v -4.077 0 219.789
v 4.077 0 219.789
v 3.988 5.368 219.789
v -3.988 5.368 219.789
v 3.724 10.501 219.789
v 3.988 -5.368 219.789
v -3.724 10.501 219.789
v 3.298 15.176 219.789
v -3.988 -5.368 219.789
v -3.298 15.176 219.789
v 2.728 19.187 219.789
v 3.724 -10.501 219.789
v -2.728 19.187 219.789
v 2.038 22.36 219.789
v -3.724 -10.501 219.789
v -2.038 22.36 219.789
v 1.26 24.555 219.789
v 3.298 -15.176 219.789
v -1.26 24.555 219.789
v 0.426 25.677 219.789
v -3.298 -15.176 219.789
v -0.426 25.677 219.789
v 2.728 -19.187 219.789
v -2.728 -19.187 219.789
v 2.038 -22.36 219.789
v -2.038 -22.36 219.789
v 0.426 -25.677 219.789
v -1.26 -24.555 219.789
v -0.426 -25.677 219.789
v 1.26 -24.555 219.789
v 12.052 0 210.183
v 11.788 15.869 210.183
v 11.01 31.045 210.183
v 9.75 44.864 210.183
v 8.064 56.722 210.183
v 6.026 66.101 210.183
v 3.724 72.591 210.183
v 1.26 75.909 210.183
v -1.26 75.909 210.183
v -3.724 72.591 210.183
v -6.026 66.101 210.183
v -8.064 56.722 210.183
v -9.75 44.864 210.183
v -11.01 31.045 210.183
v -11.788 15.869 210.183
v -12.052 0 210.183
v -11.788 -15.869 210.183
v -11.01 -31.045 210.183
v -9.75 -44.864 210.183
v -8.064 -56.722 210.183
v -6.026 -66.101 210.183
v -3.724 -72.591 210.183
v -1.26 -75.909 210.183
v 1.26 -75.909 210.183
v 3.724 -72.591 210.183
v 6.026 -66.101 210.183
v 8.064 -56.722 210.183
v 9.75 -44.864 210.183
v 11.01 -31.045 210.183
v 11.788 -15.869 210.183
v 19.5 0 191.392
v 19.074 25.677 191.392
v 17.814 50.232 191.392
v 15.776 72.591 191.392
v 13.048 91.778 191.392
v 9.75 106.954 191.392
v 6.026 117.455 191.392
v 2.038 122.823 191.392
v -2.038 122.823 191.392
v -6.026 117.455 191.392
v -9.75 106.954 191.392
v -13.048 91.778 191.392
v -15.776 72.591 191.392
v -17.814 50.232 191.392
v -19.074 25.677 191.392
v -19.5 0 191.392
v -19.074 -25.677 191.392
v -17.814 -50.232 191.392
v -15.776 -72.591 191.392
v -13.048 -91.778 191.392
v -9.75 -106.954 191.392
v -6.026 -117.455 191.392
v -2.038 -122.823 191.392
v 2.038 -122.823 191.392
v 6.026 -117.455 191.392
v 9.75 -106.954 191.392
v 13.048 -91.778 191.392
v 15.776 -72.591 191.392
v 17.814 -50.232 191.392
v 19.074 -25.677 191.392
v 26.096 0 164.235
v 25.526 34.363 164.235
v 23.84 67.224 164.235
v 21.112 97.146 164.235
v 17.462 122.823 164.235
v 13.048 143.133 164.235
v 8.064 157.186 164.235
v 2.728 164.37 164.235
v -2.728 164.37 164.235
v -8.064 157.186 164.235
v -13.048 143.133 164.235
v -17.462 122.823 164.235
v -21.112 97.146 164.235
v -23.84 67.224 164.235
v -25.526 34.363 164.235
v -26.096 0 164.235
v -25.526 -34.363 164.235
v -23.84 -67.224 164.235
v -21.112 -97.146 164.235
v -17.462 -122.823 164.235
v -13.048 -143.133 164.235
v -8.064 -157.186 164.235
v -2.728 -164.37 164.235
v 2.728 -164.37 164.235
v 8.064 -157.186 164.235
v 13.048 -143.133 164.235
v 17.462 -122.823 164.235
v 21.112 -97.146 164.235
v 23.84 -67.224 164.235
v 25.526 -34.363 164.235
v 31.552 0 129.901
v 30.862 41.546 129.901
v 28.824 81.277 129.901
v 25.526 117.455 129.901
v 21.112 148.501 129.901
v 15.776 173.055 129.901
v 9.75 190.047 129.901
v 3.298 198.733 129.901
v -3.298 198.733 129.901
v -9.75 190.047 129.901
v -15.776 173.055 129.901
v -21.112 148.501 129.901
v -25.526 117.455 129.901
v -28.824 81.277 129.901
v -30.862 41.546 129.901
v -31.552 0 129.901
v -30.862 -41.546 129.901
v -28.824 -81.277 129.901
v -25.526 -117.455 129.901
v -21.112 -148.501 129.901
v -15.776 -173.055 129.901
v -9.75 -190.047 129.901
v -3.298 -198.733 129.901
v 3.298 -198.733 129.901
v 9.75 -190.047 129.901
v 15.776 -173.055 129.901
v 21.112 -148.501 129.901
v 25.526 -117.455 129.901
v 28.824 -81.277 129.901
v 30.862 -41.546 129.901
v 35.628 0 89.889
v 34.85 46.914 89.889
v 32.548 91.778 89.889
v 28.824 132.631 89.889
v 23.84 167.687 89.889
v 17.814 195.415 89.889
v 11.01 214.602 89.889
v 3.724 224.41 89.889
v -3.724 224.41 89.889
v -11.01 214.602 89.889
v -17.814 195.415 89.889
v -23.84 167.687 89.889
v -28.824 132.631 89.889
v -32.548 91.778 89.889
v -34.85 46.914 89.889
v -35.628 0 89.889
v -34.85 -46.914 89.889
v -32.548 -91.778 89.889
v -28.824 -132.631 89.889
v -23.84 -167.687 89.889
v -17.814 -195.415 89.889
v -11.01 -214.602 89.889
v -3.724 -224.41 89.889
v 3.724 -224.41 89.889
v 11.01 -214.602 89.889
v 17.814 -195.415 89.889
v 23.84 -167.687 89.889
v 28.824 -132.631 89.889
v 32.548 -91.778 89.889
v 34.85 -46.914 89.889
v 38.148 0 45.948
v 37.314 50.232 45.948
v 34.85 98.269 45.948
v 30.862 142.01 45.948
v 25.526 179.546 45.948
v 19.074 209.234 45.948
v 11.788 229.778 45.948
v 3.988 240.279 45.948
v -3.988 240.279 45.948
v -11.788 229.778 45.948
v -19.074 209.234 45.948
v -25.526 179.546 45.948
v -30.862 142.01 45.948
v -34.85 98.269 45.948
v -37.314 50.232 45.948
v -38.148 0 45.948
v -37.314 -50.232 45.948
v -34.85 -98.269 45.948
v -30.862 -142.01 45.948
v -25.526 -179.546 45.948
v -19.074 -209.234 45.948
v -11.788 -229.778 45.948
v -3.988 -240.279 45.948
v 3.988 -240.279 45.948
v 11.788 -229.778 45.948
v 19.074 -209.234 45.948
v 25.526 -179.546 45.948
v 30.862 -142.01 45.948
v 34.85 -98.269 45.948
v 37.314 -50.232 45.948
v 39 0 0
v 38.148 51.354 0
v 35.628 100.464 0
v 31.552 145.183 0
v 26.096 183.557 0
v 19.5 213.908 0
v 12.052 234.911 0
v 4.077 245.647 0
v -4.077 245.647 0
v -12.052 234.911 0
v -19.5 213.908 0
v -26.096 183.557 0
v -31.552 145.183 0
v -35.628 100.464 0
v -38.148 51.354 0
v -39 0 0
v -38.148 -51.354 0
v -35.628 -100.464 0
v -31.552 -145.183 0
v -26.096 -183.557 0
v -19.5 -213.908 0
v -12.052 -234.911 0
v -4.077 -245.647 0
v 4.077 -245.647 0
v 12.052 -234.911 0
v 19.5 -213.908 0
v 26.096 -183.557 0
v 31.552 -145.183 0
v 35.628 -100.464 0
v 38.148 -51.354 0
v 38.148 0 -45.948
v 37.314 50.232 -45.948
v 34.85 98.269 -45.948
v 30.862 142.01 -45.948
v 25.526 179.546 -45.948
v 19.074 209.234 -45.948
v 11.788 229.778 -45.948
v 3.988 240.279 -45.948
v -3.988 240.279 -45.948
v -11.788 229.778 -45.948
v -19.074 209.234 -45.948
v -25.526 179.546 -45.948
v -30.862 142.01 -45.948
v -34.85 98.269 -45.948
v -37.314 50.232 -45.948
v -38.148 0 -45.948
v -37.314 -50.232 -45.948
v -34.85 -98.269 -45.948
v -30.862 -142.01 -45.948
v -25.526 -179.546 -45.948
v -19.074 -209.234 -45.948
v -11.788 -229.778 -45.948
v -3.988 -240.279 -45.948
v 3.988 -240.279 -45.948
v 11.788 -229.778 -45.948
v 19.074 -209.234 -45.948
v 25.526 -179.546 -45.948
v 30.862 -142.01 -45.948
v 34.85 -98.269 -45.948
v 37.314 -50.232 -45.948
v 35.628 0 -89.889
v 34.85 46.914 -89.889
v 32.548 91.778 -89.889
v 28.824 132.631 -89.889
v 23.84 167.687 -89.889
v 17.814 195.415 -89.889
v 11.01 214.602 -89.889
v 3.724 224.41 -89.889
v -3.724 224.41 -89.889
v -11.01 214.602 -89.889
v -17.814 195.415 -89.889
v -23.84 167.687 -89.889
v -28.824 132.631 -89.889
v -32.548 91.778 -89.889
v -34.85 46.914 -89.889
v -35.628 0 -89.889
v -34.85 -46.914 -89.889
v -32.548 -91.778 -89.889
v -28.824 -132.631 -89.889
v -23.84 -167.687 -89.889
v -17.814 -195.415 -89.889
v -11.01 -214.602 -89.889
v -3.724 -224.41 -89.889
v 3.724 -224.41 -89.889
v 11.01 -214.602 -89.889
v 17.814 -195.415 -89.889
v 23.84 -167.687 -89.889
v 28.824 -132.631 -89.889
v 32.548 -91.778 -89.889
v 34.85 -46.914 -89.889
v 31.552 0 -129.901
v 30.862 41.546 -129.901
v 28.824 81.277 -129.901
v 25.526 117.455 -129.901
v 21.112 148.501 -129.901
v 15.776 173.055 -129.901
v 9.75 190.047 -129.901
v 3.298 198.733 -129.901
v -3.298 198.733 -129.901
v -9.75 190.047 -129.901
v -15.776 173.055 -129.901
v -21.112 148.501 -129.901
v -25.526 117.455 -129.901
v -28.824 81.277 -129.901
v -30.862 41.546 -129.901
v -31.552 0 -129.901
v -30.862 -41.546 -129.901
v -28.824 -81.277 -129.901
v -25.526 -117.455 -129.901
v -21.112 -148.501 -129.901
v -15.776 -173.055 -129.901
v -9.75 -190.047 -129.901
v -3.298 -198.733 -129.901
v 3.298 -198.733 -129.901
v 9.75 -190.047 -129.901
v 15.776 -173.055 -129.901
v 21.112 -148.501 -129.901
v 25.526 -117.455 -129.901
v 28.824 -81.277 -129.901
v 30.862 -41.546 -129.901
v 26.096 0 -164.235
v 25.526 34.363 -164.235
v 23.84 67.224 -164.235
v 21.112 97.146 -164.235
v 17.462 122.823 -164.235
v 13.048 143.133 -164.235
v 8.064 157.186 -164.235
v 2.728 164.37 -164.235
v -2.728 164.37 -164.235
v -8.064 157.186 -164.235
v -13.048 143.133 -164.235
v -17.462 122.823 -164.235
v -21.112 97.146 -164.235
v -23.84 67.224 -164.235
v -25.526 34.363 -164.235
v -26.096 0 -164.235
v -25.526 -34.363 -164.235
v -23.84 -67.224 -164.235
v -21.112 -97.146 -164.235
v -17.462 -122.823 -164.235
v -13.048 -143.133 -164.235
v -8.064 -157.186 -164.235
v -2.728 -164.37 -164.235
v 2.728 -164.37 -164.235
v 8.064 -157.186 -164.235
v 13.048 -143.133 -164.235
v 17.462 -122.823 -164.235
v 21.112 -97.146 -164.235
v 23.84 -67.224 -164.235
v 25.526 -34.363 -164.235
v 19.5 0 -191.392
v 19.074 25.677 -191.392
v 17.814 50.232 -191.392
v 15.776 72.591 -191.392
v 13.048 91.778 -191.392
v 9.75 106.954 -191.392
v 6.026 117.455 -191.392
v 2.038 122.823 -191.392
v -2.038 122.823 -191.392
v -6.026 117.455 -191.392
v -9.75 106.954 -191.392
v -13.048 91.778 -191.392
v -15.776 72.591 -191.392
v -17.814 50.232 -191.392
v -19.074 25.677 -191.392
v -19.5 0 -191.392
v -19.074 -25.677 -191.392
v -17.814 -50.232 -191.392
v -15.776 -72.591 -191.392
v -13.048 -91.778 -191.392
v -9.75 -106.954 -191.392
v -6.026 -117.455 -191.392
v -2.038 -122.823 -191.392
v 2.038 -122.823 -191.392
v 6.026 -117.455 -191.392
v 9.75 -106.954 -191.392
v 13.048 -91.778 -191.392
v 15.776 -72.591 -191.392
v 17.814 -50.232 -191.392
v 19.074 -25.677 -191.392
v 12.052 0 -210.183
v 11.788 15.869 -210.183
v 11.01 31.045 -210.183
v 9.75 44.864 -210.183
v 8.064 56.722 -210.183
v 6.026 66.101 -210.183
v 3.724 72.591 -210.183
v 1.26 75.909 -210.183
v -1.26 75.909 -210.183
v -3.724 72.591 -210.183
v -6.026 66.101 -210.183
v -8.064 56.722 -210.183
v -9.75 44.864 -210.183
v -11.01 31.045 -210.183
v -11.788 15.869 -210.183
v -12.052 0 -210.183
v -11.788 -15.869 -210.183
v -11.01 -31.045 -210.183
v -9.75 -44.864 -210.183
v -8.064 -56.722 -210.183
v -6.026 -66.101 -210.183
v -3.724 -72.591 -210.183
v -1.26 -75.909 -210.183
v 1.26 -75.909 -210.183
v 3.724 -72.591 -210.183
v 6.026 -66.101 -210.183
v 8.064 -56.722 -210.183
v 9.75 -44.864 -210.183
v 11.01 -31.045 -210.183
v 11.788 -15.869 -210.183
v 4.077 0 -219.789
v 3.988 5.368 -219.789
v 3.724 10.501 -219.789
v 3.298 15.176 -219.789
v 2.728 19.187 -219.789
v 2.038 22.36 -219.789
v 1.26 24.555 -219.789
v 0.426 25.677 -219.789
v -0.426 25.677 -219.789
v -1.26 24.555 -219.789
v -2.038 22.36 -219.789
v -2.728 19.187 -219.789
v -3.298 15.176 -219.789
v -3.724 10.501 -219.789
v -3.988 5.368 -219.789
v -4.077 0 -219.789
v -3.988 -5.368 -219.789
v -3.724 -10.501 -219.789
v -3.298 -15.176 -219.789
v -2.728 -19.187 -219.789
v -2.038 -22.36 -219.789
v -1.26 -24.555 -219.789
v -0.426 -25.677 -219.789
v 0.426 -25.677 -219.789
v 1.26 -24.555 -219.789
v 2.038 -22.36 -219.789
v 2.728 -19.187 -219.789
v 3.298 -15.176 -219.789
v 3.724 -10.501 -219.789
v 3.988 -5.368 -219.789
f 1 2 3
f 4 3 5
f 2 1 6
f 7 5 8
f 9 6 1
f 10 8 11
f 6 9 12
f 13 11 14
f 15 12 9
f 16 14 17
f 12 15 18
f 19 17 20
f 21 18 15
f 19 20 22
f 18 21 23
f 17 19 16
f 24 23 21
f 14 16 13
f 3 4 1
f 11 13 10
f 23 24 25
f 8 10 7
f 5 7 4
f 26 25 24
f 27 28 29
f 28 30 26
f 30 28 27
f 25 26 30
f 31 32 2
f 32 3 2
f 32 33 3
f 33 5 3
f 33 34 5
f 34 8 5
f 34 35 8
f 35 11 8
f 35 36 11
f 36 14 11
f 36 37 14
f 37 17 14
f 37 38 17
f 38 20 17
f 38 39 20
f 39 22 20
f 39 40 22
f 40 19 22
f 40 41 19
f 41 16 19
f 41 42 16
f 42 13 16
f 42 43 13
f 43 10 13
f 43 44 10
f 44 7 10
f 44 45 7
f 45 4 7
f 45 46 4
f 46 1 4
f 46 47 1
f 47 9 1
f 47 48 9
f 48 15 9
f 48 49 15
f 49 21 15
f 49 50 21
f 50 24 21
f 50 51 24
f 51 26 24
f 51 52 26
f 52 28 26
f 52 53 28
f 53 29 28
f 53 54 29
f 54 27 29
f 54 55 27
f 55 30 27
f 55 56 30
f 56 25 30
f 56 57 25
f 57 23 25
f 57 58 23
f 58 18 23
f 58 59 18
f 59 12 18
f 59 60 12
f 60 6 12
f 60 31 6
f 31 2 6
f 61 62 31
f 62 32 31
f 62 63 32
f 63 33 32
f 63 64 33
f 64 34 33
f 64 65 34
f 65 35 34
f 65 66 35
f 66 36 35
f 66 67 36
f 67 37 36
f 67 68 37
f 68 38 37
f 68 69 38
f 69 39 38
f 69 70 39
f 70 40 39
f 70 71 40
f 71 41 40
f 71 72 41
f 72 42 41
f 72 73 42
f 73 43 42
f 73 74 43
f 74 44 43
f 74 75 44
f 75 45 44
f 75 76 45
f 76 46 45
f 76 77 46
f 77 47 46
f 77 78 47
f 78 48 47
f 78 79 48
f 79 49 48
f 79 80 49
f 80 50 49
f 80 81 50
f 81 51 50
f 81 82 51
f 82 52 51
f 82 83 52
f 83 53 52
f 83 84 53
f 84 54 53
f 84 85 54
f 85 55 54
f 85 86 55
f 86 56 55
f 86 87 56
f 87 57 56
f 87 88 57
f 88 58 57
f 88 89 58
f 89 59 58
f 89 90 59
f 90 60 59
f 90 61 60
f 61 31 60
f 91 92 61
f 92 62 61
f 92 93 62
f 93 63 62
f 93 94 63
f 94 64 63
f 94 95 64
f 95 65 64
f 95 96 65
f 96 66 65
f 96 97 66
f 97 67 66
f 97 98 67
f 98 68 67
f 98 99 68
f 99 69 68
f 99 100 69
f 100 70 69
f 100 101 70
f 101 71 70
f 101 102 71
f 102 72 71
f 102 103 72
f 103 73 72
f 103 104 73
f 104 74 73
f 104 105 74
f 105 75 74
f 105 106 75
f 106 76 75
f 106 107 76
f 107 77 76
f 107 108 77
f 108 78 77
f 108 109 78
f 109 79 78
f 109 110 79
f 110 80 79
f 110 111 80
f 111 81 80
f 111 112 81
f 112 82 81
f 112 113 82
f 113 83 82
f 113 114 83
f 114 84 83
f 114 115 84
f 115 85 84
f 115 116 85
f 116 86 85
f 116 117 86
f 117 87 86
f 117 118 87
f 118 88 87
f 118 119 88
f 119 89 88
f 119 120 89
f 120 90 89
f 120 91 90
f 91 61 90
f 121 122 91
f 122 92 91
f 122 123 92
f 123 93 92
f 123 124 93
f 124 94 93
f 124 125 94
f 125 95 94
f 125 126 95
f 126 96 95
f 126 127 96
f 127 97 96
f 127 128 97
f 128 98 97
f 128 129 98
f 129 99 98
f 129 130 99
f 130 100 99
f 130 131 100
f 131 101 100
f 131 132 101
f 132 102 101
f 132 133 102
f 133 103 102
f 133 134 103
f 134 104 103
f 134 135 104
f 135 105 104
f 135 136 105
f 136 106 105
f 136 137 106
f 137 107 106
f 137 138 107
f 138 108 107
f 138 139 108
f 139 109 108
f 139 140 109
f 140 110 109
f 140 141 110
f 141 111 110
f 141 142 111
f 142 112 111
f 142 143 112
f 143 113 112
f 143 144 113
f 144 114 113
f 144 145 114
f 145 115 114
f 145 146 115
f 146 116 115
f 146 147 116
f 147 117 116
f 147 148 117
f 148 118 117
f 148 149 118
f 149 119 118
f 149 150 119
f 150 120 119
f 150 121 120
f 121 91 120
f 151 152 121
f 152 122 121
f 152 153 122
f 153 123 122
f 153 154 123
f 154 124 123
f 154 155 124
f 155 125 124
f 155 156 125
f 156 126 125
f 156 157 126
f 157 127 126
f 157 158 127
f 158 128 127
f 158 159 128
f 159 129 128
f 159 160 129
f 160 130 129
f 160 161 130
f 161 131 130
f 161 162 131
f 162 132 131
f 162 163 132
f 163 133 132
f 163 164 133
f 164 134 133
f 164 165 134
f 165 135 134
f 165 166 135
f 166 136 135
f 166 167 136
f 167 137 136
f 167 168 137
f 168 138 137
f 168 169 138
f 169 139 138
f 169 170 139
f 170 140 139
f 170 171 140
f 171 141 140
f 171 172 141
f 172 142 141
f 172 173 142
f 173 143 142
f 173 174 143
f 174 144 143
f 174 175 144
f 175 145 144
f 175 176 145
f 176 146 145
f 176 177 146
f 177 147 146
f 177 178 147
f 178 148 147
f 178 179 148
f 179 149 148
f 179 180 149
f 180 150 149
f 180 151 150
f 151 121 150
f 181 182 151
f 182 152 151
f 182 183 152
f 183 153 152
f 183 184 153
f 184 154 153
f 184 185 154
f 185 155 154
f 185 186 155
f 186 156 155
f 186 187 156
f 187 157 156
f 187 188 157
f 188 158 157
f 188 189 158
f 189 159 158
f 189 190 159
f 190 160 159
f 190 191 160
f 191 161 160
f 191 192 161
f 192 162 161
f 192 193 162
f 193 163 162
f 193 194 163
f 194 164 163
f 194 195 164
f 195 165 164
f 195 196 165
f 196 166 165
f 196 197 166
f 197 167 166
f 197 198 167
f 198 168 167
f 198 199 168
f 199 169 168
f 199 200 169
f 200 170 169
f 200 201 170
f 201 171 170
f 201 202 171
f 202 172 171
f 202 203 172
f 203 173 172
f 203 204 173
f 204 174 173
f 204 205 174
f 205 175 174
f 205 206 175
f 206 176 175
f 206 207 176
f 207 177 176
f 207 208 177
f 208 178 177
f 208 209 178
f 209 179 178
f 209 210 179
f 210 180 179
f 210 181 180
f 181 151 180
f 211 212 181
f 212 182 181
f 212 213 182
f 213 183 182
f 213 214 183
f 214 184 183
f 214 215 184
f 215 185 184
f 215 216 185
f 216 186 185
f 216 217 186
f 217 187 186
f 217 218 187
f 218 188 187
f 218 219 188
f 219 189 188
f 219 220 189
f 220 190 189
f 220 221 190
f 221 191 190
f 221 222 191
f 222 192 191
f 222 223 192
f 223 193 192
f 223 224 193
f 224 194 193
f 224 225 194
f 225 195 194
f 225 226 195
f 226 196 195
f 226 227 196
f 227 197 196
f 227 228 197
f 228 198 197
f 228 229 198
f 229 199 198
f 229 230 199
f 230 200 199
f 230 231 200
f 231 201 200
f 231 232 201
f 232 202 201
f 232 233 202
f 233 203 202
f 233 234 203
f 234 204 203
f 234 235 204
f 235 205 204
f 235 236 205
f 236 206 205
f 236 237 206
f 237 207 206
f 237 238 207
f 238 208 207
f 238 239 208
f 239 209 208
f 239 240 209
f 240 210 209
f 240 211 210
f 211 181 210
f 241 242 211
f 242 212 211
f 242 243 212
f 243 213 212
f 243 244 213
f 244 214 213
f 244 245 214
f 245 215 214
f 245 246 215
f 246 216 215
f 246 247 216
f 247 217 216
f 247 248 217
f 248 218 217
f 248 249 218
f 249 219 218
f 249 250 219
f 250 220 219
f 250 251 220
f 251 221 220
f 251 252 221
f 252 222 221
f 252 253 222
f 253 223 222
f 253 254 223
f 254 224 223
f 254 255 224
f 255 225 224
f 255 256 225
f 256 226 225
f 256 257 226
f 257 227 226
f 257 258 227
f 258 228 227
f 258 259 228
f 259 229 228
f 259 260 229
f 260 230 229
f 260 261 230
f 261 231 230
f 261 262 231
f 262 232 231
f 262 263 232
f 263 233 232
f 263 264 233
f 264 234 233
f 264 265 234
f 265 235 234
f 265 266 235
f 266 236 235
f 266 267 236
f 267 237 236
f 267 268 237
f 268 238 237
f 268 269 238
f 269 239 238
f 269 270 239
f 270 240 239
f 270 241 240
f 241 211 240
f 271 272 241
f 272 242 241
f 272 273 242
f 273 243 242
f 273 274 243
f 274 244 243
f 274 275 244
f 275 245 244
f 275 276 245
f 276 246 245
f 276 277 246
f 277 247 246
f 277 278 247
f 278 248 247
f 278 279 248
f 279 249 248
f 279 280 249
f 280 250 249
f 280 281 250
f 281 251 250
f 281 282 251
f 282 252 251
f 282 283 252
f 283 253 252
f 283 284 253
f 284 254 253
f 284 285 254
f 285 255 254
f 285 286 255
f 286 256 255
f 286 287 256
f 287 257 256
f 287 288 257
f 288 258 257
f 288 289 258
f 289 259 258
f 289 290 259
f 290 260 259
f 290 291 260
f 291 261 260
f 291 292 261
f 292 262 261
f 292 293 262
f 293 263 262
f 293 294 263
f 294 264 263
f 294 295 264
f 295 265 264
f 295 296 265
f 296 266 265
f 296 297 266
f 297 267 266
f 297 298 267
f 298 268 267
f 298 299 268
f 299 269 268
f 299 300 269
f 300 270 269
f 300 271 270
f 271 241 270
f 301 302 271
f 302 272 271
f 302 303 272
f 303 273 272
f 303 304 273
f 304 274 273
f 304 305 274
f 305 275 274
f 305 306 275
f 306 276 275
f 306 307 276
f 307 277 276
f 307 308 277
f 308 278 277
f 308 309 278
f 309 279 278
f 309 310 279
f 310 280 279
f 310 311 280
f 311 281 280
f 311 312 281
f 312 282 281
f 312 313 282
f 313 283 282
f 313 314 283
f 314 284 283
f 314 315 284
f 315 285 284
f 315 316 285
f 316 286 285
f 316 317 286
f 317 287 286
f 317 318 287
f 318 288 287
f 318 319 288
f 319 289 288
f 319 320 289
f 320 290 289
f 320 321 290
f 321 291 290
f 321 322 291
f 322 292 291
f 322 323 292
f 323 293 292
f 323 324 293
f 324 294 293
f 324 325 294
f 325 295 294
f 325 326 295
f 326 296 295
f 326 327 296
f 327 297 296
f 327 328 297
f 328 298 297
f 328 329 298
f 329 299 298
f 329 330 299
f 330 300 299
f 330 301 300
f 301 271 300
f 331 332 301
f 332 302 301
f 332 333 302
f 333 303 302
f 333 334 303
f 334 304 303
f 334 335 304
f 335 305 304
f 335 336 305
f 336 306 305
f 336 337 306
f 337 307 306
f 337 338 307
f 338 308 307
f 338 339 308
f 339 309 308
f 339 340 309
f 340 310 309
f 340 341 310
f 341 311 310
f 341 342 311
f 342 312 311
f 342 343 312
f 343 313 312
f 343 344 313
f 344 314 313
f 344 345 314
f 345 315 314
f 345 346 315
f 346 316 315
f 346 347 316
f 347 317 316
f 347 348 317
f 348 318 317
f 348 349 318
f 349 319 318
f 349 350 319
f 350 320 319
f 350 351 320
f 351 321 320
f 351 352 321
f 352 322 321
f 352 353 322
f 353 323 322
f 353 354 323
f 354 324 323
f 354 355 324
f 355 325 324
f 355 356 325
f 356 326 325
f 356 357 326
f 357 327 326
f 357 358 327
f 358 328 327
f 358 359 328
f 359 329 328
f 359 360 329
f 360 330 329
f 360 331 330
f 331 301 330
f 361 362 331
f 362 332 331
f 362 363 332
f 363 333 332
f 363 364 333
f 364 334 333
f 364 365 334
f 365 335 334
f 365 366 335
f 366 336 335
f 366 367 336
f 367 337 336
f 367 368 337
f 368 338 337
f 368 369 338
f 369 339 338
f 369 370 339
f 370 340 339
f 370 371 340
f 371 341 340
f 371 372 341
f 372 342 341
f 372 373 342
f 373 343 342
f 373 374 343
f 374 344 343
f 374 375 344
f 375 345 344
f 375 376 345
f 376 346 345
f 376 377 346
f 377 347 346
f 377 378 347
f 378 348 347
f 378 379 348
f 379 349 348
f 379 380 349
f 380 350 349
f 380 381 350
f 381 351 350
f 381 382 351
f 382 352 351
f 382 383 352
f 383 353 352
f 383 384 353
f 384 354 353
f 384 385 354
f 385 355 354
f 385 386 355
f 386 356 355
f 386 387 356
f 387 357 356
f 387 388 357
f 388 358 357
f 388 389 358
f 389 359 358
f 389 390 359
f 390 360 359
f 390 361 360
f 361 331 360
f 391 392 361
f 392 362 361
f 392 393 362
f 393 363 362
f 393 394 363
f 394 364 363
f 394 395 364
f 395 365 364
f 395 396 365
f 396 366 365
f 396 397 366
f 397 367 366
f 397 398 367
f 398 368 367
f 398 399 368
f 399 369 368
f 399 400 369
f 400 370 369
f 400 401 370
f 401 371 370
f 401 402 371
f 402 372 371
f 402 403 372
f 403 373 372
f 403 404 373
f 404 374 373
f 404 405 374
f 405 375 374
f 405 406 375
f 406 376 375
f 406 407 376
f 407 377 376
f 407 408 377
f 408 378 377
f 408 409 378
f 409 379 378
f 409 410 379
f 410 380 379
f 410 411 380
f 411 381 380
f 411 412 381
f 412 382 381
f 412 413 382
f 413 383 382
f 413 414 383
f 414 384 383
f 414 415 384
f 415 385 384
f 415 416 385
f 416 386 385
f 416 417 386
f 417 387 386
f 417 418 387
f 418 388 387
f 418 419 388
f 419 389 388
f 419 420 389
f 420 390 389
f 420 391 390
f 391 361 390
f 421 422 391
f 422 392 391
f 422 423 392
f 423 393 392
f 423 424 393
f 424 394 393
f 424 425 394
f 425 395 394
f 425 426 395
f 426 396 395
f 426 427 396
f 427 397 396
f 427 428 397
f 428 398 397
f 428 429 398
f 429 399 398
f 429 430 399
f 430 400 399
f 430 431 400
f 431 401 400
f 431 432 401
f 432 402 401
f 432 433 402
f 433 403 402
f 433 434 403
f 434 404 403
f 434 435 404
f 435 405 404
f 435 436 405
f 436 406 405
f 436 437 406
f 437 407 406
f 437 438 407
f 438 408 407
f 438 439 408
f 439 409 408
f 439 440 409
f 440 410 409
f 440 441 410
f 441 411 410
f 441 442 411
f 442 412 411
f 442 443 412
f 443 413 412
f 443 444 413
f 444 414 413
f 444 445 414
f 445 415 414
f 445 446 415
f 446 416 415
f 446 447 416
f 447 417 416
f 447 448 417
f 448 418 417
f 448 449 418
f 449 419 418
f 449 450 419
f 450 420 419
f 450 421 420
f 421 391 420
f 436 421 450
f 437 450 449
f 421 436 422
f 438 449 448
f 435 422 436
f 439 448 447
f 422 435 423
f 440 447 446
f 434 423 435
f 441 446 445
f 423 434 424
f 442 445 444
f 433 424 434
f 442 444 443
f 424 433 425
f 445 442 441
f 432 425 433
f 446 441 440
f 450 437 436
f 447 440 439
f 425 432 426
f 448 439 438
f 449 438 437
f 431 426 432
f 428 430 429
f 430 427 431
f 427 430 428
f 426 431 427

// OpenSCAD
// Generated by SolidPython 1.0.1 on 2020-07-29 00:46:46


scale(v = [3, 19, 17]) {
	sphere(r = 13);
}
/***********************************************
*********      SolidPython code:      **********
************************************************
 
# import packages: SolidPython
from solid import *
from solid.utils import *
from itertools import chain, combinations, permutations


class Resize:

    def __init__(self, scad_file):
        self.scad_file = scad_file
        #self.scad_file = import_scad(scad_file)
        # cone/cylinder param:
        self.r1 = 0
        self.r2 = 0
        self.h = 0
        # rectangular prism param:
        self.w = 0
        self.l = 0
        # ellipse param:
        self.r = 0

    # import OpenScad code (file name corresponds to shape)


    # classify shape + parameters
    def assign(self, param1, param2, param3):
        if self.scad_file == 'cone.scad':
            self.r1 = param1
            self.r2 = param2
            self.h = param3
        elif self.scad_file == 'cylinder.scad':
            self.r1 = param1
            self.r2 = param2
            self.h = param3
        elif self.scad_file == 'rectangularPrism.scad':
            self.h = param1
            self.l = param2
            self.w = param3
        else:
            self.r = param1
            self.h = param2

    # resize parameters
    def iterate(self):
        x = range(3, 20, 2)
        i = 1
        if self.scad_file == 'cone.scad':
            tempList = list(permutations(x, 2))
            for temp in tempList:
                param1 = temp[0]
                param2 = temp[1]
                filepath = 'produced_scad_files/' + 'cone' + str(param1) + '_' + str(param2) + '_' + '.scad'
                scad_render_to_file(cylinder(h=param1, r1=param2, r2=0), filepath)

        elif self.scad_file == 'cylinder.scad':
            tempList = list(permutations(x, 3))
            for temp in tempList:
                param1 = temp[0]
                param2 = temp[1]
                filepath = 'produced_scad_files/' + 'cylinder' + str(param1) + '_' + str(param2) + '_' + '.scad'
                scad_render_to_file(cylinder(h=param1, r1=param2, r2=param2), filepath)

        elif self.scad_file == 'rectangularPrism.scad':
            tempList = list(permutations(x, 3))
            for temp in tempList:
                param1 = temp[0]
                param2 = temp[1]
                param3 = temp[2]
                filepath = 'produced_scad_files/' + 'rectangularPrism' + str(param1) + '_' + str(param2) + '_' + str(
                    param3) + '.scad'
                scad_render_to_file(cube(size=(param1, param2, param3)), filepath)

        elif self.scad_file == 'ellipse.scad':
            tempList = list(permutations(x, 4))
            for temp in tempList:
                param1 = temp[0]
                param2 = temp[1]
                param3 = temp[2]
                param4 = temp[3]
                filepath = 'produced_scad_files/' + 'ellipse' + str(param1) + '_' + str(param2) + '_' + str(param3) + '_' + str(param4) + '.scad'
                scad_render_to_file(scale([param1, param2, param3])(sphere(r=param4)), filepath)

    def render_to_scadfile(self):
        scad_render_to_file(scad, 'example.scad') 
 
************************************************/
